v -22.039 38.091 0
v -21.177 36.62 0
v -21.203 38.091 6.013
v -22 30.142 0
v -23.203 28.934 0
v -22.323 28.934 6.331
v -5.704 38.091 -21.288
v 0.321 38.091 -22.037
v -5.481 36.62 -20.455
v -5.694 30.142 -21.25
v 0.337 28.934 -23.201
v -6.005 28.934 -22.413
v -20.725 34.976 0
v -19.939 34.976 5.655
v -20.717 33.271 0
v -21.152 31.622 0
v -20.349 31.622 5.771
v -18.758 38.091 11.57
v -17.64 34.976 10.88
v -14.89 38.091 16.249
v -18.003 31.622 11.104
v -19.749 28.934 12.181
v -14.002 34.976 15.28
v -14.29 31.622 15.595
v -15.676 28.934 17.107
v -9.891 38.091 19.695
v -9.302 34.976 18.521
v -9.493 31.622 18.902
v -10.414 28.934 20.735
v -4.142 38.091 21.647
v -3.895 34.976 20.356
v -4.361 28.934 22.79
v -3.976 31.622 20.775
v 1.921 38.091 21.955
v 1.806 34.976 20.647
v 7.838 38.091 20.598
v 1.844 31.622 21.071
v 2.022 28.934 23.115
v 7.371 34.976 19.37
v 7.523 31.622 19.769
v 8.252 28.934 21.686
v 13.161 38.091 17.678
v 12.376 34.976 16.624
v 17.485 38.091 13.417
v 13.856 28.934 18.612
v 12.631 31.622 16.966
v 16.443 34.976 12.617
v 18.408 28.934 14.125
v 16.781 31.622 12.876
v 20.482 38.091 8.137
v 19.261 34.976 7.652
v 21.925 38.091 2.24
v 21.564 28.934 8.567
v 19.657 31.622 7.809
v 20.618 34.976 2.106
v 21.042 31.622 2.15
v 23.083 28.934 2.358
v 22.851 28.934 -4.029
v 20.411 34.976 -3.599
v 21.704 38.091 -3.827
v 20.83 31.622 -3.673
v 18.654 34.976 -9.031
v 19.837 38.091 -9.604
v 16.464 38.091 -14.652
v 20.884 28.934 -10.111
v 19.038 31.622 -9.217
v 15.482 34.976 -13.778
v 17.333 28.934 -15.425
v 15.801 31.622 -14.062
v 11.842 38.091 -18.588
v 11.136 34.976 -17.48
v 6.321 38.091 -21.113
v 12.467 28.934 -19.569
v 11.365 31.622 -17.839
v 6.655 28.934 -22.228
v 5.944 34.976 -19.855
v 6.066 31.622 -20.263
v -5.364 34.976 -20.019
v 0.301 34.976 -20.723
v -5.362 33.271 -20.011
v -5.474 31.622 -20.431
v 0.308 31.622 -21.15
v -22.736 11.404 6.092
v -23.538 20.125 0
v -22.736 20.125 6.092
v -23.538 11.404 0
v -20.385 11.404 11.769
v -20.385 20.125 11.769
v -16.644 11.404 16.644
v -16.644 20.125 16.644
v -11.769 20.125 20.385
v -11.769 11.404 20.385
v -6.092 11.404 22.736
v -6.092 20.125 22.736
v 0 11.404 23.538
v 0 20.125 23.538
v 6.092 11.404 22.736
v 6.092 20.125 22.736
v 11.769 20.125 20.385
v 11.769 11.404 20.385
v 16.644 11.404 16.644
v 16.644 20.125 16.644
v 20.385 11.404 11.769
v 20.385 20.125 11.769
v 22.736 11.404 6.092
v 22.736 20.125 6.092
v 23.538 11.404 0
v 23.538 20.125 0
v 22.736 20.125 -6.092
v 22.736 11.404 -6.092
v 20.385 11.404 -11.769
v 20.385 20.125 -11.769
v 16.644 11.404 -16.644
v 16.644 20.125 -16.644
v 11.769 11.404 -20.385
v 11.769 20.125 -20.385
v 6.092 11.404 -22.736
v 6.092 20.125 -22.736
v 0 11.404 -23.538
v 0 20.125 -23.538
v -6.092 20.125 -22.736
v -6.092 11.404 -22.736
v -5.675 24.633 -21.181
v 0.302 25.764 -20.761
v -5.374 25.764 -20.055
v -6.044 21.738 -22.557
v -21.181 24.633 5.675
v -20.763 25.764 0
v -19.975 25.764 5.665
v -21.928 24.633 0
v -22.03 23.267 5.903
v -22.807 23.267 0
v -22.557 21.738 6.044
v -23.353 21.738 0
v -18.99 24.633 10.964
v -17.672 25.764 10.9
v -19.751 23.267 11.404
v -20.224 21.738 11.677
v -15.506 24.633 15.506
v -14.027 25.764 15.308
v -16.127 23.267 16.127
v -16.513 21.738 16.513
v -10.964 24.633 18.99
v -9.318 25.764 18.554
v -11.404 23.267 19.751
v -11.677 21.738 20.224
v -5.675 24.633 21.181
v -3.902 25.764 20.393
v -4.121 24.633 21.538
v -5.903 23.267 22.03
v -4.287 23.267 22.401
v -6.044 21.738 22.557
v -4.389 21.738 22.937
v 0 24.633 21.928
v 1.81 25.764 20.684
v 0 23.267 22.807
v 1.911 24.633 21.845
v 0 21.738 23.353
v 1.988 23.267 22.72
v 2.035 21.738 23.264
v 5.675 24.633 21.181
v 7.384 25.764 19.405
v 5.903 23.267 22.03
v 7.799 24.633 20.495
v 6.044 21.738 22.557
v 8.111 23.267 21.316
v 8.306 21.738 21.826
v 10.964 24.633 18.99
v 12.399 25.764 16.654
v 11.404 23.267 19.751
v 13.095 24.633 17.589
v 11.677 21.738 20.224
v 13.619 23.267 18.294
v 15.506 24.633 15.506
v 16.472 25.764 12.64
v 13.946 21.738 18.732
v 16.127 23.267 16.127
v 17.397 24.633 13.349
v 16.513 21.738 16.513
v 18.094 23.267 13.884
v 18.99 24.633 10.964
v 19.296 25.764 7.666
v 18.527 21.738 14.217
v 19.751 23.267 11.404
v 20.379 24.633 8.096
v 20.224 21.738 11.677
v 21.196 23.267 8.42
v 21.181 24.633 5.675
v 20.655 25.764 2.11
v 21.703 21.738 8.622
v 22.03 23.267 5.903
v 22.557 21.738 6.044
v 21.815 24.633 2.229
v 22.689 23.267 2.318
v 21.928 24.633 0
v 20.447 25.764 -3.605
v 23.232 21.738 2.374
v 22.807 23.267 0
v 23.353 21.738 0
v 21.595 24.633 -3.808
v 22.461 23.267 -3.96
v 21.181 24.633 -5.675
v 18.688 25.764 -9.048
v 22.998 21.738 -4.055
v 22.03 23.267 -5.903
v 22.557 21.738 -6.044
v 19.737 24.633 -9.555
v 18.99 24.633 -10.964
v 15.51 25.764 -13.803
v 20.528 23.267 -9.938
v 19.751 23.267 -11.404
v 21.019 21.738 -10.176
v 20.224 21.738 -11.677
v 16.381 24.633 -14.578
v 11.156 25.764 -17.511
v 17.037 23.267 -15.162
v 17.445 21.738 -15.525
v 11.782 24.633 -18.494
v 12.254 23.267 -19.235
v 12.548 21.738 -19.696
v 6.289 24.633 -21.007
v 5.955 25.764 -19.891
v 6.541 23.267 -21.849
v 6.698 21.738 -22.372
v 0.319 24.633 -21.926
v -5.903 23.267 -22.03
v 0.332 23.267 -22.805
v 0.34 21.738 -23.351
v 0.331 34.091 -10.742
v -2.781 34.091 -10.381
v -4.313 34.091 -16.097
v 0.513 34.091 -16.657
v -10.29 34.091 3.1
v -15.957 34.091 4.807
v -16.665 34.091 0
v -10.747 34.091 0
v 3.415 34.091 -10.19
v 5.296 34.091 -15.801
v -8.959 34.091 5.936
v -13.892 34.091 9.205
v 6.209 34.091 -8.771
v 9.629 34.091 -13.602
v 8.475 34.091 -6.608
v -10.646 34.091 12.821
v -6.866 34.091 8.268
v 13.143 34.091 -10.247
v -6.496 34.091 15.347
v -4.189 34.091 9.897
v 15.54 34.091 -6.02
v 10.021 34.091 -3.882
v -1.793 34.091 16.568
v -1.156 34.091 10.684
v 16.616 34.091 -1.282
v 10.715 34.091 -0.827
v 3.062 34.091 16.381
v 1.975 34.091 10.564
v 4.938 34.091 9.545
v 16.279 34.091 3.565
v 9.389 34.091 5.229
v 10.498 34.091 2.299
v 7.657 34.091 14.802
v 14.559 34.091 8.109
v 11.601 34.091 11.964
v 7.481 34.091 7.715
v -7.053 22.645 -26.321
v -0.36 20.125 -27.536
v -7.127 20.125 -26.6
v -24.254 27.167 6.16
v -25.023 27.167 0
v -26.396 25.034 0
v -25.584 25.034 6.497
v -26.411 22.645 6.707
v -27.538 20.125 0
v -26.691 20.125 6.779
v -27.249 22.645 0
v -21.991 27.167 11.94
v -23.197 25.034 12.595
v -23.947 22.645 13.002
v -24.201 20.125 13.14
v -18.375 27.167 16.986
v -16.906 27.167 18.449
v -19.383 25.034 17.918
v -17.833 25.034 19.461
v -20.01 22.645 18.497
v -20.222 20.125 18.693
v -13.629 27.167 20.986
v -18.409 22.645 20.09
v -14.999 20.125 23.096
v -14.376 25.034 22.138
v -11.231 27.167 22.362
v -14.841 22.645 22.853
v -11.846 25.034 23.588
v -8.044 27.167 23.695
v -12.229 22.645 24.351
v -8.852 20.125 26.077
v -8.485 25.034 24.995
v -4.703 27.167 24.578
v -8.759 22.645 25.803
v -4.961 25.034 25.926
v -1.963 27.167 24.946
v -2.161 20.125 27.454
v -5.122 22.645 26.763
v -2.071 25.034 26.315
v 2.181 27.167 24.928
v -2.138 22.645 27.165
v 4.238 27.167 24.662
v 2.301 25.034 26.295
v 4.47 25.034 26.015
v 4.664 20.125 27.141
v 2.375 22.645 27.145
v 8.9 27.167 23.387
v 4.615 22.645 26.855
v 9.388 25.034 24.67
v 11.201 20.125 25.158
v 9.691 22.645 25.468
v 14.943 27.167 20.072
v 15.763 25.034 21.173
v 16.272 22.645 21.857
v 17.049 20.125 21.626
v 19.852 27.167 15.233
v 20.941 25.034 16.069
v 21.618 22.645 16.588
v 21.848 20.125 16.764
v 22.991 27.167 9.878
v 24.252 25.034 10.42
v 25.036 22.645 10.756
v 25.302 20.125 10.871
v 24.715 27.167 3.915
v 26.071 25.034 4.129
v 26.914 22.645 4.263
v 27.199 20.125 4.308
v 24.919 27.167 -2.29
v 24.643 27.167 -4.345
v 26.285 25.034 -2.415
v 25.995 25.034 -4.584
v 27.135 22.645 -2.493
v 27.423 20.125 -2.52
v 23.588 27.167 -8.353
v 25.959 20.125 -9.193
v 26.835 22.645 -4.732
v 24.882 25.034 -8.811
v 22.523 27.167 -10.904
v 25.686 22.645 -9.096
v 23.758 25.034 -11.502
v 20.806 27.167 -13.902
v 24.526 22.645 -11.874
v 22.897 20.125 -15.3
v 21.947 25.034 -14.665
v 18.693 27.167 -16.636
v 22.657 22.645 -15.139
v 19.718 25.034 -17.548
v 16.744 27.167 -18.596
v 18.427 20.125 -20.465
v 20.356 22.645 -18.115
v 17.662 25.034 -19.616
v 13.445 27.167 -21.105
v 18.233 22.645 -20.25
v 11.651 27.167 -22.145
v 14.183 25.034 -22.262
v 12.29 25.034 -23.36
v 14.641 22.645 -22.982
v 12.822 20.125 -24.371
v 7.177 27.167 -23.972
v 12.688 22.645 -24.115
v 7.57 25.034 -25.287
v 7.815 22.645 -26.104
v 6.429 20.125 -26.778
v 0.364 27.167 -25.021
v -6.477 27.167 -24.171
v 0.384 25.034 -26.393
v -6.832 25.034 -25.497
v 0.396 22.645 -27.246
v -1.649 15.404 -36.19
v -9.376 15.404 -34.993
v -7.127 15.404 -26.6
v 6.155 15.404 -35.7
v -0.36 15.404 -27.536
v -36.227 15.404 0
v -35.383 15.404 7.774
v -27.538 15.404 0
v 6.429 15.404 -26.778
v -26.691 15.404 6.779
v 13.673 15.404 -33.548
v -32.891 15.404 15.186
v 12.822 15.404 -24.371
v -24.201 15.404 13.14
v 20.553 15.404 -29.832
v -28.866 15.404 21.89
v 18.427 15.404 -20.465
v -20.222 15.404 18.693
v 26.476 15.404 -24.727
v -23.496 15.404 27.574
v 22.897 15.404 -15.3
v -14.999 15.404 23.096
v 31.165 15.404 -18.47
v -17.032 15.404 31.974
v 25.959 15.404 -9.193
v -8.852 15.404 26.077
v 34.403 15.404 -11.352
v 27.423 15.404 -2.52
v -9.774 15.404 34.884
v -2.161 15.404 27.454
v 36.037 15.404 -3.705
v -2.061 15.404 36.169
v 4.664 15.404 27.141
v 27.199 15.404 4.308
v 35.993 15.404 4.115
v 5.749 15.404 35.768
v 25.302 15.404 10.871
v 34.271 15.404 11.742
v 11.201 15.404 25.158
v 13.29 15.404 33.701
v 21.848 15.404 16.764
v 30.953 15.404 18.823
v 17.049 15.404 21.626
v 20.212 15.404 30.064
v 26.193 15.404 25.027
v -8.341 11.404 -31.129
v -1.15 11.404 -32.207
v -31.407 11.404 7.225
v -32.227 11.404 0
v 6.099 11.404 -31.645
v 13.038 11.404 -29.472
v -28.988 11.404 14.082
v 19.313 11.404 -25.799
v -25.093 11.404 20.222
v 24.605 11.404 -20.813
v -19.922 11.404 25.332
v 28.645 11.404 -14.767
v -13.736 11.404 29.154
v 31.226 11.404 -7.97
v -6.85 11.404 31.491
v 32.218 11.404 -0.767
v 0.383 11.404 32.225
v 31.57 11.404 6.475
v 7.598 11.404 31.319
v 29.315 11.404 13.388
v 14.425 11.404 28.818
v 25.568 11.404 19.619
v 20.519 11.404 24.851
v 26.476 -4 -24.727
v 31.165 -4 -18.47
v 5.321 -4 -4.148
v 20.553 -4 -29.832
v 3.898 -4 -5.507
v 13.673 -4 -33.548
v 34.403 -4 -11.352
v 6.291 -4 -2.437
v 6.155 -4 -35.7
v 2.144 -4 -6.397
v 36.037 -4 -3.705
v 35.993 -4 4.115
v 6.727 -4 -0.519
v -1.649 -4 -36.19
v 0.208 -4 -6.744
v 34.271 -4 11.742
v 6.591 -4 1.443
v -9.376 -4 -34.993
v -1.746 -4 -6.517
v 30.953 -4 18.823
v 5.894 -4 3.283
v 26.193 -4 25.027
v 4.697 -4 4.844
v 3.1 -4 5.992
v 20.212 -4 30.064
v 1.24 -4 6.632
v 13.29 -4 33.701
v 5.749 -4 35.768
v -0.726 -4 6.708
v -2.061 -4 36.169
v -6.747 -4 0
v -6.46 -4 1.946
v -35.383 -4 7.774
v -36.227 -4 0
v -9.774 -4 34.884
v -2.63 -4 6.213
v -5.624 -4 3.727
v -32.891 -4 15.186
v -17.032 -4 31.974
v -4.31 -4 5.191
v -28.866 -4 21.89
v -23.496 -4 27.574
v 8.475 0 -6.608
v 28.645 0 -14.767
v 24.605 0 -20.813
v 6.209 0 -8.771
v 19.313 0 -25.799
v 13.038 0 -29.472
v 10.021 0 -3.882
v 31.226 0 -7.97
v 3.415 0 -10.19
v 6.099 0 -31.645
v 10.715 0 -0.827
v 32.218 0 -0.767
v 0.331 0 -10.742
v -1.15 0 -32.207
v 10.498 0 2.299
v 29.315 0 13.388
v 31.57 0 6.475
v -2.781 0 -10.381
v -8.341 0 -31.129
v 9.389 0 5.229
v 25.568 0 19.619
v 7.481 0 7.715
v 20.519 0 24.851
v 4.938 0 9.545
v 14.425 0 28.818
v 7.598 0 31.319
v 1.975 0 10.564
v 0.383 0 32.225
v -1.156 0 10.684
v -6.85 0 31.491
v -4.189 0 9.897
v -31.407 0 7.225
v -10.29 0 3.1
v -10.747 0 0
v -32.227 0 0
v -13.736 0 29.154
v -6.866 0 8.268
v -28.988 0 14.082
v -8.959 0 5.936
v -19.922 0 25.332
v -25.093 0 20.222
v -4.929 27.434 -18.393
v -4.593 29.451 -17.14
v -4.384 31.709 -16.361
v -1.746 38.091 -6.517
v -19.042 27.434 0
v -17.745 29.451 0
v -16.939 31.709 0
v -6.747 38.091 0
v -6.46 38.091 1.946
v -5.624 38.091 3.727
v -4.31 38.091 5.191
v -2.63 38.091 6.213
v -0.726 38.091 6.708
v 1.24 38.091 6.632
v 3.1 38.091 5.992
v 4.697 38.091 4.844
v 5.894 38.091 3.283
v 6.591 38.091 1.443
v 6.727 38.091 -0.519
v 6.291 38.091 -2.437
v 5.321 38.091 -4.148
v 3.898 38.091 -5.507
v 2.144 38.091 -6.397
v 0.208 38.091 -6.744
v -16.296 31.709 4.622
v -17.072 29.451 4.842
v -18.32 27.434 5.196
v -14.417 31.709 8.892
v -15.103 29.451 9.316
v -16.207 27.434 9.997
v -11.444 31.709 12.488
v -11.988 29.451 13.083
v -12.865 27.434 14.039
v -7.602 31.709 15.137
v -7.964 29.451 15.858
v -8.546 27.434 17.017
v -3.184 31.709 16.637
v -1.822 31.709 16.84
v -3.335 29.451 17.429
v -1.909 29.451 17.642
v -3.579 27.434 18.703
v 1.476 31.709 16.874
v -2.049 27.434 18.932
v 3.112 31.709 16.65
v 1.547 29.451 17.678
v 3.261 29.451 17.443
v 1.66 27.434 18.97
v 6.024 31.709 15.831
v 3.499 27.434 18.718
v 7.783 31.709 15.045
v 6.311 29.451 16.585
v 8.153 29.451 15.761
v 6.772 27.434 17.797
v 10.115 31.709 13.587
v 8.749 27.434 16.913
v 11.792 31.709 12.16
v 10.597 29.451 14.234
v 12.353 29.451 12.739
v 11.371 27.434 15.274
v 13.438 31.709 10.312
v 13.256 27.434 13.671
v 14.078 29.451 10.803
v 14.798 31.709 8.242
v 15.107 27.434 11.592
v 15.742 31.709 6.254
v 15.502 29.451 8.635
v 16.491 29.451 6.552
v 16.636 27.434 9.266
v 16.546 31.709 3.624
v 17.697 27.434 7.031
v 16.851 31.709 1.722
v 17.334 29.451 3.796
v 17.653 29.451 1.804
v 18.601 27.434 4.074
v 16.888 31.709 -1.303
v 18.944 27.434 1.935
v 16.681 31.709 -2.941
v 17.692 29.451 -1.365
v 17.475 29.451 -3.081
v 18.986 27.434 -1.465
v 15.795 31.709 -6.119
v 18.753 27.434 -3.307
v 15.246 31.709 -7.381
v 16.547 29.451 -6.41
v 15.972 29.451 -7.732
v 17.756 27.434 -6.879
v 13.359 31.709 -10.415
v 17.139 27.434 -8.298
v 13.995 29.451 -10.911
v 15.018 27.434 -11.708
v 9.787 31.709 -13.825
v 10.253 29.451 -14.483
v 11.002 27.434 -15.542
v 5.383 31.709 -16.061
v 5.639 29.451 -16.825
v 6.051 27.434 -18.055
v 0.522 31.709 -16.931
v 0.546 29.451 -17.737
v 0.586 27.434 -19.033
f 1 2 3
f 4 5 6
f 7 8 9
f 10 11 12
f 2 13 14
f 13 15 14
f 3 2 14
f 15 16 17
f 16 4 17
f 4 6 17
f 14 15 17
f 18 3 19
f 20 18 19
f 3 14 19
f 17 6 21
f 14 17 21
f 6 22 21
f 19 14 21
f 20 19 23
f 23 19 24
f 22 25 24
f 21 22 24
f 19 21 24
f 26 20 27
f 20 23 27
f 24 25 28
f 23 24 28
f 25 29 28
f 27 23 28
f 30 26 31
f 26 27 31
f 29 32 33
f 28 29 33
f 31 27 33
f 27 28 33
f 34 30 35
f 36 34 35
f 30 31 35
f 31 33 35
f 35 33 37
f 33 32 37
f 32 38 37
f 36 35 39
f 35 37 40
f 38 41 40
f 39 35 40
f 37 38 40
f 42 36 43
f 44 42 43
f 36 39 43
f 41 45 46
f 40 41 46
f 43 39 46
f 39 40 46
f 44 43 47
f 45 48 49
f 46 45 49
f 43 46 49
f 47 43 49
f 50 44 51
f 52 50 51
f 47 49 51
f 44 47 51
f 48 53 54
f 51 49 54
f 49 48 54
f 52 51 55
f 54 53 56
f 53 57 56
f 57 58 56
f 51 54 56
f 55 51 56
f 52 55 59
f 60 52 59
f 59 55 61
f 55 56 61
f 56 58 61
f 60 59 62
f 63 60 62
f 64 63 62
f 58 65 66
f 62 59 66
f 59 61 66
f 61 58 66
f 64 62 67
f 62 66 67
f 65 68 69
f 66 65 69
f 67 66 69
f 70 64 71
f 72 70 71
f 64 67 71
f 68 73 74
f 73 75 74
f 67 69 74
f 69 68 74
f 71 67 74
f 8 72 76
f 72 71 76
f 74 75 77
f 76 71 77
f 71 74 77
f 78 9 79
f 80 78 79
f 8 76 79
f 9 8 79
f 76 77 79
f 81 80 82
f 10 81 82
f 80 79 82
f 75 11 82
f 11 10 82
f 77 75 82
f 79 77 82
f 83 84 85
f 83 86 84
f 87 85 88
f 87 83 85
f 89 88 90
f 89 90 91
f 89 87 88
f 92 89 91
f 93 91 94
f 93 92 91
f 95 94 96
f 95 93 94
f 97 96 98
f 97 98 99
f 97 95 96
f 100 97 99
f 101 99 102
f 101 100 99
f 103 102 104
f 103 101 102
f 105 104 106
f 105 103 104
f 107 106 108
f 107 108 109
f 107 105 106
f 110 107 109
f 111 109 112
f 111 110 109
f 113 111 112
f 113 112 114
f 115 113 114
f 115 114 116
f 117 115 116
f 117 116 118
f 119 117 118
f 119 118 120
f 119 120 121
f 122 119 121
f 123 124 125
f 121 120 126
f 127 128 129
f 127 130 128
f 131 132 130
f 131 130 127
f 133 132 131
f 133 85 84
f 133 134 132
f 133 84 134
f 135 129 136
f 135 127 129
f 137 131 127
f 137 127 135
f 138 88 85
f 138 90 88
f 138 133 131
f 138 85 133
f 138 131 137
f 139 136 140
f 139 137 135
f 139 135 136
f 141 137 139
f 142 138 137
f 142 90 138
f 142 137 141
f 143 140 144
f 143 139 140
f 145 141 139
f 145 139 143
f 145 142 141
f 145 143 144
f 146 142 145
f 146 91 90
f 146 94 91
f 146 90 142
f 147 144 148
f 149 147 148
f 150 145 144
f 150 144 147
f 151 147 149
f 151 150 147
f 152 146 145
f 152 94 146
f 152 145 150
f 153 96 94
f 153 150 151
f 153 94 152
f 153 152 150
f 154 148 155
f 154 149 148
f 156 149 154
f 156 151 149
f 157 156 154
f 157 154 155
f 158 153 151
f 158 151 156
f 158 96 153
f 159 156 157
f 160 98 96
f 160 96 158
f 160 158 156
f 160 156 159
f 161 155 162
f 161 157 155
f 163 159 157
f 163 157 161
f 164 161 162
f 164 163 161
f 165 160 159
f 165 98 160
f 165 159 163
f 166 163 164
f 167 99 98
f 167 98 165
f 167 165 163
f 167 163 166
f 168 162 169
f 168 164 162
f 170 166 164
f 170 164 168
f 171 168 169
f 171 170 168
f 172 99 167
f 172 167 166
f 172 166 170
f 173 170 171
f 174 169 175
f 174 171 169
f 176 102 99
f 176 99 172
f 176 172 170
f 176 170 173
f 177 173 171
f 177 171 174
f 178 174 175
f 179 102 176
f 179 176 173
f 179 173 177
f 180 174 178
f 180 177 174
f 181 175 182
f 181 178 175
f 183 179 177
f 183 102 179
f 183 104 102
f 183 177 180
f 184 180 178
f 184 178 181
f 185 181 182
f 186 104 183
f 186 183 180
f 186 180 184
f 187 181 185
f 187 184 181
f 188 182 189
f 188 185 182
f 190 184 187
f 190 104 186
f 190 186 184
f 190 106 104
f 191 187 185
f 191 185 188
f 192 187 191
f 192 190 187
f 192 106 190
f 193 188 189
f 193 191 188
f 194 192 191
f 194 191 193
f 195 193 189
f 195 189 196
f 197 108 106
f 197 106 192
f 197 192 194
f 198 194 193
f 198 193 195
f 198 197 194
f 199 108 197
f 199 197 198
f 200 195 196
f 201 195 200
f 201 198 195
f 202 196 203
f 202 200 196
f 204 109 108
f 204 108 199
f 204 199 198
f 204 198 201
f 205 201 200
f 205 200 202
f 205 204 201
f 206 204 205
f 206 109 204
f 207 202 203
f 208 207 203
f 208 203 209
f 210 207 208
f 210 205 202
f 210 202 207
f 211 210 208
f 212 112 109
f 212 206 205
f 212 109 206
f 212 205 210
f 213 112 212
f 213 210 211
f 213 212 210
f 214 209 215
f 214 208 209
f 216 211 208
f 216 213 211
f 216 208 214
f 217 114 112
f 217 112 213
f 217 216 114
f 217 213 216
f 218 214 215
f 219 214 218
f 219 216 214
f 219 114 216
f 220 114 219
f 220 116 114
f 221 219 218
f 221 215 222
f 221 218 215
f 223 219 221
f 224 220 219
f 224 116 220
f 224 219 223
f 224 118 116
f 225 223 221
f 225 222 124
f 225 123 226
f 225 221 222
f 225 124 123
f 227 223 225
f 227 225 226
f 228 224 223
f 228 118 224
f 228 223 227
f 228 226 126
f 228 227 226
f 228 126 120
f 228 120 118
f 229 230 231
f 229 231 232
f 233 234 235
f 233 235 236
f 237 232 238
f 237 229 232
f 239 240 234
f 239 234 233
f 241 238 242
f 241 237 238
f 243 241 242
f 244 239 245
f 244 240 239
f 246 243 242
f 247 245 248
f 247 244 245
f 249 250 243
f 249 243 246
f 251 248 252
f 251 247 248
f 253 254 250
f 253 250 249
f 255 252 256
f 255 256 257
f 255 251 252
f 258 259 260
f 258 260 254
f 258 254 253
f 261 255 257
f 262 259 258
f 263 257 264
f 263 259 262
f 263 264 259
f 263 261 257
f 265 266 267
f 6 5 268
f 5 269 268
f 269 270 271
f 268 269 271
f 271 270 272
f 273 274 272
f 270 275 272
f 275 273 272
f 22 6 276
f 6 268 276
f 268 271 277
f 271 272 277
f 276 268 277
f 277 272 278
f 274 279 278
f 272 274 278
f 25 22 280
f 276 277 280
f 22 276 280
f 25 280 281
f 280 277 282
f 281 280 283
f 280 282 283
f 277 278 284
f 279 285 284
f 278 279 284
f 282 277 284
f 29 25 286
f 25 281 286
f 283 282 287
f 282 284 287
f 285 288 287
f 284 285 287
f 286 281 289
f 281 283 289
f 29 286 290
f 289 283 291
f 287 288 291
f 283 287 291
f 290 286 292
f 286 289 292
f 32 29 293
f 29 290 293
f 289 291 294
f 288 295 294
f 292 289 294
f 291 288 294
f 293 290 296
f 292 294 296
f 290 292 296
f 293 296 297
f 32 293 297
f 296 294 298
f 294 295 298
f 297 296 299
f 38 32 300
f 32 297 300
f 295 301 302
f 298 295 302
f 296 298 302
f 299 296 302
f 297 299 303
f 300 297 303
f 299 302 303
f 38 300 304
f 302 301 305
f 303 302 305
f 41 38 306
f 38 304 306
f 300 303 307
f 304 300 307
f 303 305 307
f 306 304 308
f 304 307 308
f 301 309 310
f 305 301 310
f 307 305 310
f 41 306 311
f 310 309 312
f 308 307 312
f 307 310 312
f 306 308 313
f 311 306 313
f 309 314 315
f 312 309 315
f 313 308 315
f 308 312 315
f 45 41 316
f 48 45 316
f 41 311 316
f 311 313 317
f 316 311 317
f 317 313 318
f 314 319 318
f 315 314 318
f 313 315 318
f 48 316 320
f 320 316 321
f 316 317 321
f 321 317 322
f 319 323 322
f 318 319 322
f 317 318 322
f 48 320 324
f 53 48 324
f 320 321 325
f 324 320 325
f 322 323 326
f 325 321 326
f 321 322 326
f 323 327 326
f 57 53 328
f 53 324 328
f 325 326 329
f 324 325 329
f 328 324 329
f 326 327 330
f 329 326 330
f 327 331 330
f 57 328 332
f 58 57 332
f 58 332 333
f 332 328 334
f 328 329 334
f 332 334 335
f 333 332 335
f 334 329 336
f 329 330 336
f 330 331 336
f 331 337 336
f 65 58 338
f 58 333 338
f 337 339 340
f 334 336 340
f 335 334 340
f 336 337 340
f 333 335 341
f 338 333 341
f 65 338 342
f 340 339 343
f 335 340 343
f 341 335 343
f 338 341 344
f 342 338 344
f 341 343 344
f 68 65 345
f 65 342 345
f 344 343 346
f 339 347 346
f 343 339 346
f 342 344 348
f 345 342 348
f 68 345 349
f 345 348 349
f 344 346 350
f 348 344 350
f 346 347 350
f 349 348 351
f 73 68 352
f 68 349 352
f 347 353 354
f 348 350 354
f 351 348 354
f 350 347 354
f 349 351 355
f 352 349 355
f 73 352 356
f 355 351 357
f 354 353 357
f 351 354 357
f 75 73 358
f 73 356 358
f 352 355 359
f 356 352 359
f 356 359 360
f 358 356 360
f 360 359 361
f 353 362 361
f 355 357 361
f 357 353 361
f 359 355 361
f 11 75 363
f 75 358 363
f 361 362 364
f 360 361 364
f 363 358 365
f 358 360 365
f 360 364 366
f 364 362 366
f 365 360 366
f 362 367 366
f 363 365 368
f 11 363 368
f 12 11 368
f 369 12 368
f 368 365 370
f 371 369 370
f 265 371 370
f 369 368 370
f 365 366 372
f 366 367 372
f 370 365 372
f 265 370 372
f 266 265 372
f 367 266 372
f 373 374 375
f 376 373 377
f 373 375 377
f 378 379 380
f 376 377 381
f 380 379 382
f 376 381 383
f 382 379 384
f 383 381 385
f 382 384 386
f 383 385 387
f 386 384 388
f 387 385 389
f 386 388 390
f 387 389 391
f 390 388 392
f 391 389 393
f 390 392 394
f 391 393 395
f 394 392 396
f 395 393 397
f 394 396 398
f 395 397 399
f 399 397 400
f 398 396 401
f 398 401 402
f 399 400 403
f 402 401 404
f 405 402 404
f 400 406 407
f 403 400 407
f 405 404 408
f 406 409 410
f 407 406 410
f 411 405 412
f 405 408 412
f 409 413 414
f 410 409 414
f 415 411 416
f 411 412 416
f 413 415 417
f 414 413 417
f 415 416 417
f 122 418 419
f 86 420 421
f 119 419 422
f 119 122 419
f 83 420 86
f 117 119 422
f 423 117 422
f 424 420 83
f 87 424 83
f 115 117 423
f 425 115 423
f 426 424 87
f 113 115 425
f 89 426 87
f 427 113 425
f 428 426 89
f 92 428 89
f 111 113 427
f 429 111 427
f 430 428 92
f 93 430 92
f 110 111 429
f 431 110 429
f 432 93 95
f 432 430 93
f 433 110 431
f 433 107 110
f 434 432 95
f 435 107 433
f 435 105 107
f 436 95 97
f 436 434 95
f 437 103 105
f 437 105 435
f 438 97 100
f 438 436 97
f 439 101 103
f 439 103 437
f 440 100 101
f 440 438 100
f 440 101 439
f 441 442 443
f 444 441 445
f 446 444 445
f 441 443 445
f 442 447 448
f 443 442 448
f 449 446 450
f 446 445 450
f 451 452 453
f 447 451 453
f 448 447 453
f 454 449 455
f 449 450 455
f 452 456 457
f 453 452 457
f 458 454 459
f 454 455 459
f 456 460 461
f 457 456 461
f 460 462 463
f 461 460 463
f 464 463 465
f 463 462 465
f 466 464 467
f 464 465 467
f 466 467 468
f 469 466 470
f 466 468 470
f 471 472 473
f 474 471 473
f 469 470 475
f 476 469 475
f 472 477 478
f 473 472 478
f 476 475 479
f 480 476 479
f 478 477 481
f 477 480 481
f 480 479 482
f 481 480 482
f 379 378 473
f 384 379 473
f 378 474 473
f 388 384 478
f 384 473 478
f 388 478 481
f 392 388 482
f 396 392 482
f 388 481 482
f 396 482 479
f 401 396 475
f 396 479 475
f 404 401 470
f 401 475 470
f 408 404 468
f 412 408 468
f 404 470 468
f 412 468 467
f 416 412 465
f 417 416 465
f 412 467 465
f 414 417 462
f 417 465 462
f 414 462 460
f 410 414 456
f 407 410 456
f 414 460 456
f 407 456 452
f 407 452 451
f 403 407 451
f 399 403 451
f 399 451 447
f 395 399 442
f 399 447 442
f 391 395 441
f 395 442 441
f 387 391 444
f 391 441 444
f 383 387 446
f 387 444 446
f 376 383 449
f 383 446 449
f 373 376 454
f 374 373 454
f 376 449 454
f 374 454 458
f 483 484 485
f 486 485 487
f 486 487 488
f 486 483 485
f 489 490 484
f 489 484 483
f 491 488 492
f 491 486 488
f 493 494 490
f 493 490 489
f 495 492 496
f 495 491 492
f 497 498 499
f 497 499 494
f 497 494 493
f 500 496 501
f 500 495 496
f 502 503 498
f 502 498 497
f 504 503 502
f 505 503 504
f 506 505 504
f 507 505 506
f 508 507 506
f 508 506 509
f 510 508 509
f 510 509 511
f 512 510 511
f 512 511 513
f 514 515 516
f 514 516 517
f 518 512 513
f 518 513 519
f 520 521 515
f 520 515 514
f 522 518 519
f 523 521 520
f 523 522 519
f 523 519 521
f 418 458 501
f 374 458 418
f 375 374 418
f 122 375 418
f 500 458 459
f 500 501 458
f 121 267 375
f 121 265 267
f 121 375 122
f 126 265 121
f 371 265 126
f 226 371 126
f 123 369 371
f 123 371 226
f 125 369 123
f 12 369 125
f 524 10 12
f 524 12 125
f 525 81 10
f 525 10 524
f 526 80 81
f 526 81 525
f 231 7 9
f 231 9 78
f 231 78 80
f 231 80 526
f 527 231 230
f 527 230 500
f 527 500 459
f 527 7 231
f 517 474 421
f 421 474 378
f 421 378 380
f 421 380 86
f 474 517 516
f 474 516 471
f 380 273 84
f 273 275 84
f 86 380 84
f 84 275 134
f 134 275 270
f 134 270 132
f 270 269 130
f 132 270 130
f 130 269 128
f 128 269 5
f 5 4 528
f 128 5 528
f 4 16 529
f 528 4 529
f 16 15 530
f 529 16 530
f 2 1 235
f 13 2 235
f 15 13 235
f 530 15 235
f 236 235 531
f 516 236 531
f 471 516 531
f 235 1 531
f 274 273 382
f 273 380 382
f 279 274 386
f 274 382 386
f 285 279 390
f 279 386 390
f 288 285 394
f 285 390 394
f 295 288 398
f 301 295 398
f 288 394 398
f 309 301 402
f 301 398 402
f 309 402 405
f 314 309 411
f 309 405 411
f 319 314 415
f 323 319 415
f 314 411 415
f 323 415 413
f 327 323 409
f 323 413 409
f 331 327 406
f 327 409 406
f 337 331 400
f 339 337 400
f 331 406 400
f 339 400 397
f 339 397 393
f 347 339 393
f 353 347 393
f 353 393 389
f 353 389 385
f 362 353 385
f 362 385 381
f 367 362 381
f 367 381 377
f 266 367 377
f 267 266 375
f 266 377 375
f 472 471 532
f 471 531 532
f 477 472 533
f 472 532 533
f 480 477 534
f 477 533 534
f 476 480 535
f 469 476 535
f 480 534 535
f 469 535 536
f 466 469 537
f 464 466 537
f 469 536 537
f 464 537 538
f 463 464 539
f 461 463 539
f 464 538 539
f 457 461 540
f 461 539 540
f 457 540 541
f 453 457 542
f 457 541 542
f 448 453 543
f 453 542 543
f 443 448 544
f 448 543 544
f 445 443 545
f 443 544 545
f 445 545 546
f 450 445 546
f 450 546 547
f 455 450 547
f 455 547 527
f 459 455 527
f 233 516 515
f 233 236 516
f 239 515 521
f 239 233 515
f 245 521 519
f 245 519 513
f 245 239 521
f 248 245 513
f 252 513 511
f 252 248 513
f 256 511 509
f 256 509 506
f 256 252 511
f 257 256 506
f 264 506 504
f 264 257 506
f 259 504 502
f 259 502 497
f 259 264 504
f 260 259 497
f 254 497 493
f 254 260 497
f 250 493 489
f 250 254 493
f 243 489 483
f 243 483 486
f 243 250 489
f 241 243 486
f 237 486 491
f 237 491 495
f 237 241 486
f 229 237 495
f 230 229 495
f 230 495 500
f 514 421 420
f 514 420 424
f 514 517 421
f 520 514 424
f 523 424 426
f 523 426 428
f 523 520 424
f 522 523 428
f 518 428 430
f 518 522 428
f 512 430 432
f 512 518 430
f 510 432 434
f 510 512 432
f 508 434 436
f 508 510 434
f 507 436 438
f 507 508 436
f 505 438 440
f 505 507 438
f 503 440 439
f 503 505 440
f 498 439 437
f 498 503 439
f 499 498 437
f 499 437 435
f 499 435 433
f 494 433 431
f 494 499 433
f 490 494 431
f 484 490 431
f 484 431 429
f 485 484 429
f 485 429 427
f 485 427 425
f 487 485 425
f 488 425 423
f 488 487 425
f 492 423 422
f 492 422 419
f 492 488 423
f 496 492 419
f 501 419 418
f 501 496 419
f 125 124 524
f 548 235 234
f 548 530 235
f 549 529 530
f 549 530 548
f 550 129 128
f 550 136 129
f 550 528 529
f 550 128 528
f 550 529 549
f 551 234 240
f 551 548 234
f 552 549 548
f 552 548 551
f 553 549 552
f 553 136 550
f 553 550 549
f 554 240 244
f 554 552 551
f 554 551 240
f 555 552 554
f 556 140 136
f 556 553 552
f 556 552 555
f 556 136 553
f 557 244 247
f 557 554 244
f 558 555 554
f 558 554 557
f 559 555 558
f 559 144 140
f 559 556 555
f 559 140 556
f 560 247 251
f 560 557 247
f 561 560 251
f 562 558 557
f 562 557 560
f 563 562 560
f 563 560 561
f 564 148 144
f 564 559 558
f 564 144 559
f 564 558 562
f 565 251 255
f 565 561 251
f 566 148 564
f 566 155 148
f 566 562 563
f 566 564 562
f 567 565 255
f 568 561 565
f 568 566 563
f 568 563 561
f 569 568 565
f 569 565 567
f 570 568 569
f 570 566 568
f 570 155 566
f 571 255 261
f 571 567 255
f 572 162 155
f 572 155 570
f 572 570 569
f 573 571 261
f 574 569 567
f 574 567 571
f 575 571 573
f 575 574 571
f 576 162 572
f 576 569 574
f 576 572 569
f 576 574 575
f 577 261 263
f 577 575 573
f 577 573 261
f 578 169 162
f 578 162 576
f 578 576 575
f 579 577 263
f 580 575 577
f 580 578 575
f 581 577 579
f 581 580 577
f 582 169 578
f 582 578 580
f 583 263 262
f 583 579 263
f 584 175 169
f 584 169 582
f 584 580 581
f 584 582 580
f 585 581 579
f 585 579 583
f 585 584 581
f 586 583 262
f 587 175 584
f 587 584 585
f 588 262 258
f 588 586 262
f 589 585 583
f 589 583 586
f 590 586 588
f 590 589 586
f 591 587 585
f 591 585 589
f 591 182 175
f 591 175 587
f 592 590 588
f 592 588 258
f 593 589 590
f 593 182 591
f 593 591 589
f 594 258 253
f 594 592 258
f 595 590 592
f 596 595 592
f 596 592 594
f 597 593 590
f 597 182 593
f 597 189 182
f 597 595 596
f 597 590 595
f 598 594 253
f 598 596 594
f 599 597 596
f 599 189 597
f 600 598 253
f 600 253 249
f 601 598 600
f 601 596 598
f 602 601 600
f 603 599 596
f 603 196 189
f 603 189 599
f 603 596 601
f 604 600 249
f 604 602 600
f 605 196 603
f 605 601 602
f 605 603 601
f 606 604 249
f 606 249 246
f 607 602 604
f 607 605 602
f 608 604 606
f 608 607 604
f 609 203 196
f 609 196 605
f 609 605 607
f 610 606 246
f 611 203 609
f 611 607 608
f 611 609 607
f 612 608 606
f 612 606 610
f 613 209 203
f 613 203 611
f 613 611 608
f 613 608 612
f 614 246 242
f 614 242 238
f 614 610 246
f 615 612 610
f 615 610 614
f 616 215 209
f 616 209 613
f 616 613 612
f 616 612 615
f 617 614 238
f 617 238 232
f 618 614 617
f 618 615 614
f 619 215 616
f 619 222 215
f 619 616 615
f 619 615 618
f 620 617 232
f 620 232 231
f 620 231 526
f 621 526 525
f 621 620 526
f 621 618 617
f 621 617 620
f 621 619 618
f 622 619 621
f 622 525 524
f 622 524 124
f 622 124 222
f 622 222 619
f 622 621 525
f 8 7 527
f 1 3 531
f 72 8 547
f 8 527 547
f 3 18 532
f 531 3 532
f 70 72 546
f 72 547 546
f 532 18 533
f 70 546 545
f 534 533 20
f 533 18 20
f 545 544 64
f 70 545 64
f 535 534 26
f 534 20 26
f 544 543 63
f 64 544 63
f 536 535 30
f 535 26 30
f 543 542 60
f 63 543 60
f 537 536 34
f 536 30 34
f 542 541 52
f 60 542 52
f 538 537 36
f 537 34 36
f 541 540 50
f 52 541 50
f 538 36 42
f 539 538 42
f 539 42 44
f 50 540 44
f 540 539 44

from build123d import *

# Parameters (mm, degrees)
REVOLVE_THIN1_ANGLE = 285


with BuildPart() as part:
    # Sketch1 → Revolve-Thin1 (revolve)
    with BuildSketch(Plane.XY):
        with BuildLine():
            Line((-27.538484773, 20.124551934), (-27.538484773, 15.403929488))
            Line((-27.538484773, 15.403929488), (-36.227206247, 15.403929488))
            Line((-36.227206247, 15.403929488), (-36.227206247, -4))
            Line((-36.227206247, -4), (-6.746755937, -4))
            Line((-6.746755937, -4), (-6.746755937, 38.091146669))
            Line((-6.746755937, 38.091146669), (-22.039284373, 38.091146669))
            ThreePointArc((-22.039284373, 38.091146669), (-20.717051221, 33.270500036), (-23.203151183, 28.933883676))
            ThreePointArc((-23.203151183, 28.933883676), (-26.395944189, 25.033712837), (-27.538484773, 20.124551934))
        make_face()
        with BuildLine():
            Line((-23.538484773, 20.124551934), (-23.538484773, 11.403929488))
            Line((-23.538484773, 11.403929488), (-32.227206247, 11.403929488))
            Line((-32.227206247, 11.403929488), (-32.227206247, 0))
            Line((-32.227206247, 0), (-10.746755937, 0))
            Line((-10.746755937, 0), (-10.746755937, 34.091146669))
            Line((-10.746755937, 34.091146669), (-16.665109009, 34.091146669))
            ThreePointArc((-16.665109009, 34.091146669), (-17.745052772, 29.450945899), (-20.762920969, 25.764455257))
            ThreePointArc((-20.762920969, 25.764455257), (-22.807008354, 23.267491001), (-23.538484773, 20.124551934))
        make_face(mode=Mode.SUBTRACT)
    revolve(axis=Axis((0, 0, 0), (0, 1, 0)), revolution_arc=REVOLVE_THIN1_ANGLE)


solid = part.part
